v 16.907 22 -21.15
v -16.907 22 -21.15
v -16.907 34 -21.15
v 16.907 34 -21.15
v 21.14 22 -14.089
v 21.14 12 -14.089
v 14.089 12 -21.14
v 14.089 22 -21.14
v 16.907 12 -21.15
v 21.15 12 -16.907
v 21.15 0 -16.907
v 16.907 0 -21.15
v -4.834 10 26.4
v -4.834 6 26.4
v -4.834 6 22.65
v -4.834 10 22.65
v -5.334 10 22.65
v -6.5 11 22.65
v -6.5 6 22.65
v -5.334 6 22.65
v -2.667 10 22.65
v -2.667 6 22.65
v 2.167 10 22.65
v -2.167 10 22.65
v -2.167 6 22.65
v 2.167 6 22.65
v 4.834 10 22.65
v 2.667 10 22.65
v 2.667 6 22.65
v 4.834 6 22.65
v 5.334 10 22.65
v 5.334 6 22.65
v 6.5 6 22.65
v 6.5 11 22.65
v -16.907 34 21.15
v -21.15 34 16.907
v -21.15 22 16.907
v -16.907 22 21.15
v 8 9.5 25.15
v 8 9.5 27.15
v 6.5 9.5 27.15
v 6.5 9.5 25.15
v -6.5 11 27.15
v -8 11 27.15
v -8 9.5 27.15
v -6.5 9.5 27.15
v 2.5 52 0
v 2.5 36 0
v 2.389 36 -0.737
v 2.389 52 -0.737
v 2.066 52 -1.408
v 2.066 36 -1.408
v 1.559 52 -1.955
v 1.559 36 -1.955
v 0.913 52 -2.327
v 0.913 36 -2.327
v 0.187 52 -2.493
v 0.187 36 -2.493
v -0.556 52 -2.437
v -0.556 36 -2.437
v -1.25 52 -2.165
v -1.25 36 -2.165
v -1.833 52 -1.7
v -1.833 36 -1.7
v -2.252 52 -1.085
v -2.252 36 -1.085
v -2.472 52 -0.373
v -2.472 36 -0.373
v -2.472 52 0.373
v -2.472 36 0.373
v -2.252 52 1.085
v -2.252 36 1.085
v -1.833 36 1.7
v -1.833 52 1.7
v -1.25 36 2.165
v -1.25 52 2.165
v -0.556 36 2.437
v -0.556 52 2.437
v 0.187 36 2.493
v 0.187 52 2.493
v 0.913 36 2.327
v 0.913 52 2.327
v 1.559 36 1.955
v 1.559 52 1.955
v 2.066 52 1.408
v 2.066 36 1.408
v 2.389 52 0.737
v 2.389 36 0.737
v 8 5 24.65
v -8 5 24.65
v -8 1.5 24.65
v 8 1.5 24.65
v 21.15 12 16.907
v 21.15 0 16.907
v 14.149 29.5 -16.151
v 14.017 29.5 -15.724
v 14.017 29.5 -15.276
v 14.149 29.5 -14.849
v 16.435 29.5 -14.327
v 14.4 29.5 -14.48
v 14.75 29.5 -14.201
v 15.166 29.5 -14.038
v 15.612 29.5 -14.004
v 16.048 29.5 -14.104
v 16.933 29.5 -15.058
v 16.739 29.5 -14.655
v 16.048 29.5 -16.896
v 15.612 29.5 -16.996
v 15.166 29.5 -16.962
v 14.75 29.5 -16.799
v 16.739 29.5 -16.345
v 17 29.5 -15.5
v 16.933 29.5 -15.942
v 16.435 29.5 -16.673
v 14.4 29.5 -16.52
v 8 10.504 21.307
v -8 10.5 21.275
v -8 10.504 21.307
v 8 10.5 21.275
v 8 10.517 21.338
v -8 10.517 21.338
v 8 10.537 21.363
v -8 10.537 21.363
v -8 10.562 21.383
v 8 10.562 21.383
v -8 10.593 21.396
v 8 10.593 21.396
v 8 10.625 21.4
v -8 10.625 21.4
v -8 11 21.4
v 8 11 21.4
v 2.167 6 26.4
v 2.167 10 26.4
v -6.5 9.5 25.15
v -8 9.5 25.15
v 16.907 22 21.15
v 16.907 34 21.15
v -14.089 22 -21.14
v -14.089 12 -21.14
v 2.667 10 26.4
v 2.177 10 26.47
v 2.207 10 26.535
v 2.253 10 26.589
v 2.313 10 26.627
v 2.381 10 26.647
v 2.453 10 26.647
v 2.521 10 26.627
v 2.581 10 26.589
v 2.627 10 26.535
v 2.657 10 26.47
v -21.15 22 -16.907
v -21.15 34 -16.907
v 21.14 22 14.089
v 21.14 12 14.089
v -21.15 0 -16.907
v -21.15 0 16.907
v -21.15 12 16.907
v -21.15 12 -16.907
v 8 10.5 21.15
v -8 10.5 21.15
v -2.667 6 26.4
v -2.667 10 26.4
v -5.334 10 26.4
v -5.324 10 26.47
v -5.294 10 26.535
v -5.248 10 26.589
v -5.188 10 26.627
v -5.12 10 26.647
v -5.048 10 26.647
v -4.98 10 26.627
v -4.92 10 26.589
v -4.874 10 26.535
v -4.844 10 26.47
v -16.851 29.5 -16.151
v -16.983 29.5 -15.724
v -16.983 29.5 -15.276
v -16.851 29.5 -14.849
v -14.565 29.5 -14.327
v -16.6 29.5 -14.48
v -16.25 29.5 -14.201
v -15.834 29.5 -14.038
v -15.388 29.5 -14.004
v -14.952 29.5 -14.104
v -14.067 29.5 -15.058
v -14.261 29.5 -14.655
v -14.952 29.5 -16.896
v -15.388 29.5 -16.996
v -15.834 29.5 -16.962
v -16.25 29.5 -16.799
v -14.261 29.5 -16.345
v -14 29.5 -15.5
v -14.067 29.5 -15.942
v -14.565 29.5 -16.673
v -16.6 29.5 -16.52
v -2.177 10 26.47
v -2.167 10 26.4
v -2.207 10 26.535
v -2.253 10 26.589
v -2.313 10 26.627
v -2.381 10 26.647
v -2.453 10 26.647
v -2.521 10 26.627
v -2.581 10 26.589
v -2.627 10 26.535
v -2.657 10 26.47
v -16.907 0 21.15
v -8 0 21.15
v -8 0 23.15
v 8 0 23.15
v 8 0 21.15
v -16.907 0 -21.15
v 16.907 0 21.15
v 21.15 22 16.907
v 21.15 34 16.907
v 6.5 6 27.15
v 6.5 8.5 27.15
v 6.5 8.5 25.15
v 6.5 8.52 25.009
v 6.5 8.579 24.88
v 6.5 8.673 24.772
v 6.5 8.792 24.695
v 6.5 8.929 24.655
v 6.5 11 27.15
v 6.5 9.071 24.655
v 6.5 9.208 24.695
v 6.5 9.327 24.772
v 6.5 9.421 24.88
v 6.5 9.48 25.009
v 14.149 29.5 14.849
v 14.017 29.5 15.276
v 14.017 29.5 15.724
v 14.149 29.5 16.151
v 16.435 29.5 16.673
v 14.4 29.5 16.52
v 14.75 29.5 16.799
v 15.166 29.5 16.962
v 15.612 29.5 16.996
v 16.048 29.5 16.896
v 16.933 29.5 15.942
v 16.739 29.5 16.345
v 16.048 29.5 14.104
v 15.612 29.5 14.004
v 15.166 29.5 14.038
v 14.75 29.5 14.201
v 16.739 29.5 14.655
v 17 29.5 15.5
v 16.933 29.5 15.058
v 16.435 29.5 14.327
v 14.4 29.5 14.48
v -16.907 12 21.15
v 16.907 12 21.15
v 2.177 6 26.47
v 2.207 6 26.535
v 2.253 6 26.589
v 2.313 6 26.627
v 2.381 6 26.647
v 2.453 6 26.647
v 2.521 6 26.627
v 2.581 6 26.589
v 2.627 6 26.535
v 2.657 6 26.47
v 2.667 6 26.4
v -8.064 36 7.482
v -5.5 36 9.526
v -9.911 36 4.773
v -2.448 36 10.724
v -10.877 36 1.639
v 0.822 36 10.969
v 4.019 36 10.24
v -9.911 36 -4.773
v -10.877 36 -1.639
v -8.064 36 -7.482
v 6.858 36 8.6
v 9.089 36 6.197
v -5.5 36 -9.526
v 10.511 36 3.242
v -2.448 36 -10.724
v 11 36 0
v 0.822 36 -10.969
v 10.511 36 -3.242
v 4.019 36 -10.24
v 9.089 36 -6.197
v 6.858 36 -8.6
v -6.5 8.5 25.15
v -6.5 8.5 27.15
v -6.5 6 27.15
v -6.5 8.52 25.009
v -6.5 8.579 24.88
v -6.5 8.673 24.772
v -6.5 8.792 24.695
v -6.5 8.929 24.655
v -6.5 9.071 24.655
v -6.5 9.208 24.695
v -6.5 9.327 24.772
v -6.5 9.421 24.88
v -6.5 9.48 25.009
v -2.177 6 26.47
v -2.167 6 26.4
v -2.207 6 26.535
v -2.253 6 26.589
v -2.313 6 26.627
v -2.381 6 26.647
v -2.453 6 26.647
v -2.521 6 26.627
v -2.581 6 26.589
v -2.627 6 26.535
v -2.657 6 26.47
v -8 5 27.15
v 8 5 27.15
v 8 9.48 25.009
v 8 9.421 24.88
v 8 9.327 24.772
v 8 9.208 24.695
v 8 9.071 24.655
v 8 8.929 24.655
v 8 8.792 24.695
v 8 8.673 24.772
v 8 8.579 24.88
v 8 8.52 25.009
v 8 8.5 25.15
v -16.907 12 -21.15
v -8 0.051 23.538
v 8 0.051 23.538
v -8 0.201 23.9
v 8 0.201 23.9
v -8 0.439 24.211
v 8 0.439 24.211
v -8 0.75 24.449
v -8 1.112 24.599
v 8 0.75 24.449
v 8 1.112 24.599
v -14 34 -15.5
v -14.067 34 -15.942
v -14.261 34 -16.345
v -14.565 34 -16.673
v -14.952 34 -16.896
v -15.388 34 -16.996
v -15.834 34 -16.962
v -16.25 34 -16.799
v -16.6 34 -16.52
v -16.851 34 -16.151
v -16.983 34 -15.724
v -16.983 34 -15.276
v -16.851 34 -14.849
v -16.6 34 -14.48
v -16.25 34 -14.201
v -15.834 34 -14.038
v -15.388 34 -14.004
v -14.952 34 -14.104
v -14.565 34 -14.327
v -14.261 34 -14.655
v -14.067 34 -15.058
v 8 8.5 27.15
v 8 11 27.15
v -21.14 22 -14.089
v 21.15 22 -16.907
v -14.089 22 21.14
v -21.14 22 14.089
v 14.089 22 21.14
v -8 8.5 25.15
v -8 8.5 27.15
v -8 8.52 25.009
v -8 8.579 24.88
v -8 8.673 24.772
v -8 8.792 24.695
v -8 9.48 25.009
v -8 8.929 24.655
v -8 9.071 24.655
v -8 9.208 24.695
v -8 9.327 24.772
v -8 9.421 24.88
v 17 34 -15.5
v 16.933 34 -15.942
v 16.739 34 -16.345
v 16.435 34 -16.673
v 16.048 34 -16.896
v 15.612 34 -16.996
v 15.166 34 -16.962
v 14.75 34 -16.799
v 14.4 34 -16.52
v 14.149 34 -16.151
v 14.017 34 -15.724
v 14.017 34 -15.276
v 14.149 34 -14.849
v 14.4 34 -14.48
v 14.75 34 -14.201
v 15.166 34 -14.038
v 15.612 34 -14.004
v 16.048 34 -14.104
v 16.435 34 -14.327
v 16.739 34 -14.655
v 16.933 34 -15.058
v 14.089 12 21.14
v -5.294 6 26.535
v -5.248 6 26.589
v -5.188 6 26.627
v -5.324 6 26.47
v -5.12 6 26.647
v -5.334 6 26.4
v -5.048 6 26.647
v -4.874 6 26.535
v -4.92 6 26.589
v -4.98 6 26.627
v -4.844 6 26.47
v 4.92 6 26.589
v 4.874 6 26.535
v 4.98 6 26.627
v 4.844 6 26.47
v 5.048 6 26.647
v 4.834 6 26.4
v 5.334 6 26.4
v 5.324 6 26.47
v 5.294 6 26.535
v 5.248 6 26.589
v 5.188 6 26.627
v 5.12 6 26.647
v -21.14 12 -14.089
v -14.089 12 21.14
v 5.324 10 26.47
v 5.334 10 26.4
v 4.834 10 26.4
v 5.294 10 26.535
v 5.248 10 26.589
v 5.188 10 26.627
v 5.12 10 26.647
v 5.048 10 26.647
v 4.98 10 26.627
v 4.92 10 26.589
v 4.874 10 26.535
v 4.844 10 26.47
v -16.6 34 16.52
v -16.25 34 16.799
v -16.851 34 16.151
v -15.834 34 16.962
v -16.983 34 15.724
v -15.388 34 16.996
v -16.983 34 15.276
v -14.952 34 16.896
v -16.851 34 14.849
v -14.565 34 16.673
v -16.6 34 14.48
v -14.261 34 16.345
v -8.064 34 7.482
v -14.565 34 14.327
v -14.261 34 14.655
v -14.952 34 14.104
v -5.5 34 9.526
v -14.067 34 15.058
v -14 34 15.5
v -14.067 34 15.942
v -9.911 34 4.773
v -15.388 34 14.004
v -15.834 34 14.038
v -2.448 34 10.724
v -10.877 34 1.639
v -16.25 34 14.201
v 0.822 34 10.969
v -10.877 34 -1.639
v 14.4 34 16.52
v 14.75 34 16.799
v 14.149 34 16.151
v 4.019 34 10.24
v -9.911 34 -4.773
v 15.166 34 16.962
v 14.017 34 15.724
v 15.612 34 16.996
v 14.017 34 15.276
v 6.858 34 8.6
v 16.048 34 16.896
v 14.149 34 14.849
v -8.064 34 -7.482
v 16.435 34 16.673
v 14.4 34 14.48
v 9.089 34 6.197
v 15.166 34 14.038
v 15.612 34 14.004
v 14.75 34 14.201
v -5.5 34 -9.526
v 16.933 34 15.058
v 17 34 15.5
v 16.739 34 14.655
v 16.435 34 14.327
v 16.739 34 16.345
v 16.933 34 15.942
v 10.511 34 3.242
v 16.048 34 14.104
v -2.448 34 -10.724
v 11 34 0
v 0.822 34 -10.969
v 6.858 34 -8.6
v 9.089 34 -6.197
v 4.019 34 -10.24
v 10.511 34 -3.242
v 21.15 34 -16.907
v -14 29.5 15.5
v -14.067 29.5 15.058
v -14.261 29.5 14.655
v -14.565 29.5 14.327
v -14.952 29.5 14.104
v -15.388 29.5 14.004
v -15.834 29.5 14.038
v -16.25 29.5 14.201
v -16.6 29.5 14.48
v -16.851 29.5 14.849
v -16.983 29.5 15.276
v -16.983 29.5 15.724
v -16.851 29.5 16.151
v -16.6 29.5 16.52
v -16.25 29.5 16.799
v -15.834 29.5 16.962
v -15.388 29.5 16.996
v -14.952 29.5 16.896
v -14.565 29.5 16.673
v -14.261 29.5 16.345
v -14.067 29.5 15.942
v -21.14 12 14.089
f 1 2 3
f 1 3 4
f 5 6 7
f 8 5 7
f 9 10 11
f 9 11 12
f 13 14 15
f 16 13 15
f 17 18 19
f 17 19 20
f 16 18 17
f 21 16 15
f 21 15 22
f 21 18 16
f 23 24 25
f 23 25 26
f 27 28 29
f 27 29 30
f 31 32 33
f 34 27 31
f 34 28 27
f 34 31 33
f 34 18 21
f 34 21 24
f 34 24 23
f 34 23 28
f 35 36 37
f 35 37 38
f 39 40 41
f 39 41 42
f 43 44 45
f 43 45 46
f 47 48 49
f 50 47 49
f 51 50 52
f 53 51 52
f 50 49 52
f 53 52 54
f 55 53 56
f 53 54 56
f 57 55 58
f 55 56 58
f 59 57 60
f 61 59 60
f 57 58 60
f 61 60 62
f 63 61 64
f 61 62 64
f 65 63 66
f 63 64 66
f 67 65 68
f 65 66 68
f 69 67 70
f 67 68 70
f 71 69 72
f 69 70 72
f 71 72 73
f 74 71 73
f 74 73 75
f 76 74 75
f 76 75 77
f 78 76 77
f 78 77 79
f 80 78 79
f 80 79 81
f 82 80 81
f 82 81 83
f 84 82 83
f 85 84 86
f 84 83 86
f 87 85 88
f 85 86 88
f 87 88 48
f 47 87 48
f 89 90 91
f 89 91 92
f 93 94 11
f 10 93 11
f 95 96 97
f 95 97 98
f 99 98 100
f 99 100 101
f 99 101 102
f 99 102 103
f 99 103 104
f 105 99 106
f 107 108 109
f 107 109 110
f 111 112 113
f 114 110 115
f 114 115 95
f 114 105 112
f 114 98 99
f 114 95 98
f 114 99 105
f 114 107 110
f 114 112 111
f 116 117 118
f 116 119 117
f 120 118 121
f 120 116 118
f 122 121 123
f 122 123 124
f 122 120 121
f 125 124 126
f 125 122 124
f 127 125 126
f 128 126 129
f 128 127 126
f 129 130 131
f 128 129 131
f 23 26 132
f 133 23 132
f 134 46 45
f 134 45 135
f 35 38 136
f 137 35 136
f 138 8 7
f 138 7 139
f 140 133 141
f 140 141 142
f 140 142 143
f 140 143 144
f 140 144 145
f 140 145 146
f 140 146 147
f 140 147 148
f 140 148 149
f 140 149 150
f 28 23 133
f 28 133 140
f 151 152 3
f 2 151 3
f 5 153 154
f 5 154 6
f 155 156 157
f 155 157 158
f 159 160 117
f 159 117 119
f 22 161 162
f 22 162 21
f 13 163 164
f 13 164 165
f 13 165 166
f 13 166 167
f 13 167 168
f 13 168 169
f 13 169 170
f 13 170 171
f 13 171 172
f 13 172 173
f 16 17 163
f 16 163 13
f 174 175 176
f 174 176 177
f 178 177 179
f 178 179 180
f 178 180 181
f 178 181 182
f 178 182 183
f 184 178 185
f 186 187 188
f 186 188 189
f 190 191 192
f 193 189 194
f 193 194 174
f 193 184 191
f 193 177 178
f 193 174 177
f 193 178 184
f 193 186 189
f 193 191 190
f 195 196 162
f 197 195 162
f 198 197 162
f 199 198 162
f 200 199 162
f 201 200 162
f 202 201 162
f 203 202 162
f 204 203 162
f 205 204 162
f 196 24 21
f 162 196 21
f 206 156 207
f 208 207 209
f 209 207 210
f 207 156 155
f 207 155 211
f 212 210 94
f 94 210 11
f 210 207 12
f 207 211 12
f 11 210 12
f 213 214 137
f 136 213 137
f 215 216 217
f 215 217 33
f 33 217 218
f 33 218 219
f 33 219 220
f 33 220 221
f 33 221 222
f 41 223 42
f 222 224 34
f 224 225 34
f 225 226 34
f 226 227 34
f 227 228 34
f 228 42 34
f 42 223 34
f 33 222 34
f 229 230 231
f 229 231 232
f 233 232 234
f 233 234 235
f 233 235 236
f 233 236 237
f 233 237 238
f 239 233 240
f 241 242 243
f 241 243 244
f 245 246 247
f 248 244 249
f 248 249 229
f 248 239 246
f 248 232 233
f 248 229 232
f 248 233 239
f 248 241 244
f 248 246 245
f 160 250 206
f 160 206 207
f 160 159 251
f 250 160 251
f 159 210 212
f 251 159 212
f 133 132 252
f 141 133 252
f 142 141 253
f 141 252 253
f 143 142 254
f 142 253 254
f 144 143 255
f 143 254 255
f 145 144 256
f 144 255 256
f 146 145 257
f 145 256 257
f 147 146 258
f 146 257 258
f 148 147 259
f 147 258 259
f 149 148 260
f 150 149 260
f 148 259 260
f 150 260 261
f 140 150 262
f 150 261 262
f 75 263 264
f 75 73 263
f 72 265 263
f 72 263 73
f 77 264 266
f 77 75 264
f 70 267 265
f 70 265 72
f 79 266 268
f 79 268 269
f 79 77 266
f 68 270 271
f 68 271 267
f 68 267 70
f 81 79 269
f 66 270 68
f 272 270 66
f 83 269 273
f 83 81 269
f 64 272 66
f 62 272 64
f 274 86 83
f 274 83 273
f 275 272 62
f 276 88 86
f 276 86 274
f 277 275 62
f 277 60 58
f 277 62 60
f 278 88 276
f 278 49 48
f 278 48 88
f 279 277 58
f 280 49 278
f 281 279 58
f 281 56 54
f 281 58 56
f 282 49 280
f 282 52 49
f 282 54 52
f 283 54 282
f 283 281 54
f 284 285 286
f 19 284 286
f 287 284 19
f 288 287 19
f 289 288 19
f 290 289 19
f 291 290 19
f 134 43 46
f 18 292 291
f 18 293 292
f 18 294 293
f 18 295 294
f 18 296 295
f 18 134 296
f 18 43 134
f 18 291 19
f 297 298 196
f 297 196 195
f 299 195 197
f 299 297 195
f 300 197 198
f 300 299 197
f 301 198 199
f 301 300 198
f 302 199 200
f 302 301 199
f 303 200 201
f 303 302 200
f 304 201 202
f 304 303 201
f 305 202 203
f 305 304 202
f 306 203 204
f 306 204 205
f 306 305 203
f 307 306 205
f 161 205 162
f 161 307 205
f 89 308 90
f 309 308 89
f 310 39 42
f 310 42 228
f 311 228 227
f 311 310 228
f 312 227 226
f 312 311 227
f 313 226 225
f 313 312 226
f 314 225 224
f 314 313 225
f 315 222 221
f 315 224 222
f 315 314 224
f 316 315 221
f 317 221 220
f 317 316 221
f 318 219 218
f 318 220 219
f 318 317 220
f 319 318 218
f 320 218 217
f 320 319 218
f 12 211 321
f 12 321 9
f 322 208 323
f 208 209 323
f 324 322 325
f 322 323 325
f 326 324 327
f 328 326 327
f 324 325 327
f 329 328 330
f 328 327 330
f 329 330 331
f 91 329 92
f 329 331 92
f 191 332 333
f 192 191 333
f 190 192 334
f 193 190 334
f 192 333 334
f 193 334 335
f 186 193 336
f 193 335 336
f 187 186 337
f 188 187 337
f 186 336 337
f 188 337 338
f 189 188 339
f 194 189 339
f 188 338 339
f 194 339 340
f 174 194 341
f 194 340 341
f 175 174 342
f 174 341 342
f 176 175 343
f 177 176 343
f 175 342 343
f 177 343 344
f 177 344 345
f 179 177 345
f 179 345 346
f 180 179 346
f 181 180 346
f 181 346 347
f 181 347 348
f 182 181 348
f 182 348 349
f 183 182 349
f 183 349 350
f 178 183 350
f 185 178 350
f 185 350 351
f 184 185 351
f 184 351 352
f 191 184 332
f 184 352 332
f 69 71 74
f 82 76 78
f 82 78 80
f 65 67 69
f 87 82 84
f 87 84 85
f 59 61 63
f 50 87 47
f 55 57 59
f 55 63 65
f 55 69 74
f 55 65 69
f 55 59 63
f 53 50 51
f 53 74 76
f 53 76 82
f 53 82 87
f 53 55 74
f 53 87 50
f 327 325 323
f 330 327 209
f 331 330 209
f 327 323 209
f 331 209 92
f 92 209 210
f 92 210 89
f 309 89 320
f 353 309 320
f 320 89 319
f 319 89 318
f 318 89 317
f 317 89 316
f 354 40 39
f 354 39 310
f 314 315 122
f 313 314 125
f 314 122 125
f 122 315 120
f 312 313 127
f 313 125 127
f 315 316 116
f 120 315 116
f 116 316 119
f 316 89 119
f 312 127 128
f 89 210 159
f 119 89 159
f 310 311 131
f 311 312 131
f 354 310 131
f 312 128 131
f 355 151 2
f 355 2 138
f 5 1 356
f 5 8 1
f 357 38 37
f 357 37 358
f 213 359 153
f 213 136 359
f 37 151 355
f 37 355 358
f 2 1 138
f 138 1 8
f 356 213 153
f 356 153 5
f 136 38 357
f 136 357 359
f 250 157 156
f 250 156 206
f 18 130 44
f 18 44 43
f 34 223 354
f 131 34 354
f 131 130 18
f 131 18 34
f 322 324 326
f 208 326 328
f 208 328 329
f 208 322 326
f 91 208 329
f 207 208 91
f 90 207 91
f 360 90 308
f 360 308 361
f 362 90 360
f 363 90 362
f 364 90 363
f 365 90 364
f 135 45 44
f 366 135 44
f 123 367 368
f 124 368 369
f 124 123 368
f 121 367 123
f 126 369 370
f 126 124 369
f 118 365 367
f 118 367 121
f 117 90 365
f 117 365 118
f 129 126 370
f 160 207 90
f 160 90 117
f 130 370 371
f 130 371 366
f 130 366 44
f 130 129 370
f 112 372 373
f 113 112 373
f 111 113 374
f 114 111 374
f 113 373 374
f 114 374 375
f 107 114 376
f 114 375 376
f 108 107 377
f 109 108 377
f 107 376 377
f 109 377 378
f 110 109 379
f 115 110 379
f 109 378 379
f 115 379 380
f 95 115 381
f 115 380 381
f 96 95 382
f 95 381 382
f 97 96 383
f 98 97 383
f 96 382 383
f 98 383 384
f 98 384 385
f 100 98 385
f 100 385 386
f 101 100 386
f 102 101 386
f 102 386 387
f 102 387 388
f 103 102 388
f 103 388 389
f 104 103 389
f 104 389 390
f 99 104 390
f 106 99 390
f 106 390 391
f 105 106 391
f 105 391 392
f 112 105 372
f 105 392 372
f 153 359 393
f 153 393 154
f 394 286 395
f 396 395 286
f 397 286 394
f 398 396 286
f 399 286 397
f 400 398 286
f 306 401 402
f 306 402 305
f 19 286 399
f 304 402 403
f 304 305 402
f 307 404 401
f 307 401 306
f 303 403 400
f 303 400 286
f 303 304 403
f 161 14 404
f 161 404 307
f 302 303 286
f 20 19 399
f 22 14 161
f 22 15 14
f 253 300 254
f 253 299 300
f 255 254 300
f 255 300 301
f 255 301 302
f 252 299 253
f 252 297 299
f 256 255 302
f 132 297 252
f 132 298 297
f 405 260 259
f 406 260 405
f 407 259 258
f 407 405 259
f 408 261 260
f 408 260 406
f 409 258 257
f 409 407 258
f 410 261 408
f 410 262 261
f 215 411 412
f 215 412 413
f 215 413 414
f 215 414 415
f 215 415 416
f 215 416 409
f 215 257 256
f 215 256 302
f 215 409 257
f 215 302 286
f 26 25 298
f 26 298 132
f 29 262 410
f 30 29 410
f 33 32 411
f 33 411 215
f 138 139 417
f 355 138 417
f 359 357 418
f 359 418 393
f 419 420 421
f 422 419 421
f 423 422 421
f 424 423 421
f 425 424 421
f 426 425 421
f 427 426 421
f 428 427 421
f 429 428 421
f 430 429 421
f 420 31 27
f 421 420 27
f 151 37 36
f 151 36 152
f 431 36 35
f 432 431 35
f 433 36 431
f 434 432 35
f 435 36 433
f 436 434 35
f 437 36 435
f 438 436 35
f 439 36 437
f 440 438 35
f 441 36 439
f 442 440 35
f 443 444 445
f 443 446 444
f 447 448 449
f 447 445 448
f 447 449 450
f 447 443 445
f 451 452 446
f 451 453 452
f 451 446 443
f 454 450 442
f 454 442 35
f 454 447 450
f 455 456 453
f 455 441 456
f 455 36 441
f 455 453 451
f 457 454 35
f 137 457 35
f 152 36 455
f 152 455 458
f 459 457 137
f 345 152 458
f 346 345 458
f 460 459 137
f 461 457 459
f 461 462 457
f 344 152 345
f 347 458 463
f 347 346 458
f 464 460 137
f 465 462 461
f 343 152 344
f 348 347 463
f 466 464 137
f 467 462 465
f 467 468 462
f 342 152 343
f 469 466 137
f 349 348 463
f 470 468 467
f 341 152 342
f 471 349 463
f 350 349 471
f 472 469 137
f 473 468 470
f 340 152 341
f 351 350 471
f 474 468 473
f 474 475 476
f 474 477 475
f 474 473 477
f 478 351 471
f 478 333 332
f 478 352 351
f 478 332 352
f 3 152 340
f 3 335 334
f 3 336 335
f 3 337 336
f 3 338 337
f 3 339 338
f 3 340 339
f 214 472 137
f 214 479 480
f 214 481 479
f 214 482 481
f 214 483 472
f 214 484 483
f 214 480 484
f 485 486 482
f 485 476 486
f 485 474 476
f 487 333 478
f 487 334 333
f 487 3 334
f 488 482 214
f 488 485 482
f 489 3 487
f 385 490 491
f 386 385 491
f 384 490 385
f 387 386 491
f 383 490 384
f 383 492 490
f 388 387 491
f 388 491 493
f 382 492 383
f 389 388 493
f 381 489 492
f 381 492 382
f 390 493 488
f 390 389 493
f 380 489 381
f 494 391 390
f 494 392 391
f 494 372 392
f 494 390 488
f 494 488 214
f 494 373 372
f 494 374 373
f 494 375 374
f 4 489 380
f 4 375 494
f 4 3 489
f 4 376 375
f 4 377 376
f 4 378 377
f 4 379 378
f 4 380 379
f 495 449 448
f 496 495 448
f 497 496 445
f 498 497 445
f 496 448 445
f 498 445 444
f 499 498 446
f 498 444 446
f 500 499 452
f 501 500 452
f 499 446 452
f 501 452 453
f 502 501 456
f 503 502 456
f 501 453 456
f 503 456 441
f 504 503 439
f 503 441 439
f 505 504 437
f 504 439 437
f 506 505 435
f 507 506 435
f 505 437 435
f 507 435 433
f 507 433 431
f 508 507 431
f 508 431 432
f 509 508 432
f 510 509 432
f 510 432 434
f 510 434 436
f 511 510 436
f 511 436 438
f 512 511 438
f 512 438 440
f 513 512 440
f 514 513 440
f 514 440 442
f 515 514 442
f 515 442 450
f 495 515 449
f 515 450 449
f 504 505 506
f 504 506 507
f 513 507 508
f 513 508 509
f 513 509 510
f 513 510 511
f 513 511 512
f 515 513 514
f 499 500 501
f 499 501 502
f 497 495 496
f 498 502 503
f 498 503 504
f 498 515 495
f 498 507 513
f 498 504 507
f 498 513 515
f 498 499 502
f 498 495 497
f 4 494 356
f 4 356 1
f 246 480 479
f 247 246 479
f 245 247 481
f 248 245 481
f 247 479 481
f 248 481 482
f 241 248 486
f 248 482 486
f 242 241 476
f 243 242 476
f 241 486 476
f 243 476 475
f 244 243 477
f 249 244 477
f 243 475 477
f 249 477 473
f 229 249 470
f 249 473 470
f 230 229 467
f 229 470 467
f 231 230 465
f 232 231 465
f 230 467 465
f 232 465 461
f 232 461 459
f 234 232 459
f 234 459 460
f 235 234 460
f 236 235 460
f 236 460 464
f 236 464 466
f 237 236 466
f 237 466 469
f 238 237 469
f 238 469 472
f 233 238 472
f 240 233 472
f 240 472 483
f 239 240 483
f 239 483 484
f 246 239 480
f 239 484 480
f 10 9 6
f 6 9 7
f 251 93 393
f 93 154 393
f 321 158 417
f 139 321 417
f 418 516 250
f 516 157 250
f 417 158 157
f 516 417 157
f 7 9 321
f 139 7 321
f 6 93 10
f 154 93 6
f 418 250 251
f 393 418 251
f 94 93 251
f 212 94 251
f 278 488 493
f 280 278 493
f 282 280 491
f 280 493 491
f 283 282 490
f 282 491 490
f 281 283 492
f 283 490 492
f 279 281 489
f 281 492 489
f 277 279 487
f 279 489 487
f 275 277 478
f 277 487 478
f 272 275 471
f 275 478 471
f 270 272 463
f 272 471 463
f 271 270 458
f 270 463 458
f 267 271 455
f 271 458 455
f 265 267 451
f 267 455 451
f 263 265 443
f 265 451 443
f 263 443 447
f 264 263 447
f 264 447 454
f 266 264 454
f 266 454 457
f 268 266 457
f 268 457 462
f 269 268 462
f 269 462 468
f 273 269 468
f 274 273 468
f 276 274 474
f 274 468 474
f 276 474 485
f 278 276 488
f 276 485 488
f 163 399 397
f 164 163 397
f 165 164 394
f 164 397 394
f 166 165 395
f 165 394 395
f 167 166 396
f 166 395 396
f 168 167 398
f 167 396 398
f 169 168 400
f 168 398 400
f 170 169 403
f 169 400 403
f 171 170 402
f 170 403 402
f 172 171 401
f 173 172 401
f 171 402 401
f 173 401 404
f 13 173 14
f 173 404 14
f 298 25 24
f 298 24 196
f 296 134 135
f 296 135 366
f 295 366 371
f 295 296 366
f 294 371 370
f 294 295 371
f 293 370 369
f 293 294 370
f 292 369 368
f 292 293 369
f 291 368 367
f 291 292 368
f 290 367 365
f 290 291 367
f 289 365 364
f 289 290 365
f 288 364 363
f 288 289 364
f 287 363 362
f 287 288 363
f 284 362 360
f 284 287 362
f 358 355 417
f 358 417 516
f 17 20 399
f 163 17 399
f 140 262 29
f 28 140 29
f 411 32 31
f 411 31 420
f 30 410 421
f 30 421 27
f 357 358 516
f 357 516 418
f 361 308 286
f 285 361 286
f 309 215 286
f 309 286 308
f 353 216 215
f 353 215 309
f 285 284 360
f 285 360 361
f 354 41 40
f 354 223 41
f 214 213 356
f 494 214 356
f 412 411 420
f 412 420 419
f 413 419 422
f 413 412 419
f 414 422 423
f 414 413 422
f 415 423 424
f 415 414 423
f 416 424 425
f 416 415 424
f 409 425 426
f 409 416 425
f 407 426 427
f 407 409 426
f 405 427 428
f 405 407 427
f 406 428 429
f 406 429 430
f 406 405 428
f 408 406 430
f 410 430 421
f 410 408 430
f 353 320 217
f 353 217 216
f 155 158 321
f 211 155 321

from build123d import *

# Parameters (mm, degrees)
SKETCH1_W               = 42.3
SKETCH1_H               = 42.3
BOSS_EXTRUDE1_DEPTH     = 34
SKETCH2_R               = 11
BOSS_EXTRUDE2_DEPTH     = 2
SKETCH3_R               = 2.5
BOSS_EXTRUDE3_DEPTH     = 16
CUT_EXTRUDE1_DEPTH      = 19
CUT_EXTRUDE1_DEPTH_BACK = 35
SKETCH5_W               = 33.814718626
SKETCH5_H               = 10
CUT_EXTRUDE2_DEPTH      = 0.01
CUT_EXTRUDE3_START      = -12
CUT_EXTRUDE3_DEPTH      = 10
CIRPATTERN1_COUNT       = 4
SKETCH7_R               = 1.5
CUT_EXTRUDE4_DEPTH      = 4.5
SKETCH8_W               = 16
SKETCH8_H               = 11
BOSS_EXTRUDE4_DEPTH     = 6
SKETCH9_W               = 16
SKETCH9_H               = 5
CUT_EXTRUDE5_DEPTH      = 2.5
FILLET1_R               = 1.5
SKETCH10_W              = 13
SKETCH10_H              = 4.5
CUT_EXTRUDE6_DEPTH      = 5
CUT_EXTRUDE7_DEPTH      = 30.15
BOSS_EXTRUDE5_DEPTH     = 4
SKETCH13_W              = 16
SKETCH13_H              = 0.25
CUT_EXTRUDE8_DEPTH      = 0.5
FILLET2_R               = 0.125


with BuildPart() as part:
    # Sketch1 → Boss-Extrude1 (new body)
    with BuildSketch(Plane(origin=(0, 0, 0), x_dir=(1, 0, 0), z_dir=(0, 1, 0))):
        Rectangle(SKETCH1_W, SKETCH1_H)
    extrude(amount=BOSS_EXTRUDE1_DEPTH)

    # Sketch2 → Boss-Extrude2 (add)
    with BuildSketch(Plane(origin=(0, 34, 0), x_dir=(1, 0, 0), z_dir=(0, 1, 0))):
        Circle(SKETCH2_R)
    extrude(amount=BOSS_EXTRUDE2_DEPTH)

    # Sketch3 → Boss-Extrude3 (add)
    with BuildSketch(Plane(origin=(0, 36, 0), x_dir=(1, 0, 0), z_dir=(0, 1, 0))):
        Circle(SKETCH3_R)
    extrude(amount=BOSS_EXTRUDE3_DEPTH)

    # Sketch4 → Cut-Extrude1 (cut, two sides)
    with BuildSketch(Plane(origin=(0, 34, 0), x_dir=(1, 0, 0), z_dir=(0, 1, 0))) as cut_extrude1_sk:
        Polygon((-21.15, 16.907359313), (-16.907359313, 21.15), (-21.15, 21.15), align=None)
        Polygon((21.15, 21.15), (21.15, 16.907359313), (16.907359313, 21.15), align=None)
        Polygon((21.15, -16.907359313), (16.907359313, -21.15), (21.15, -21.15), align=None)
        Polygon((-21.15, -21.15), (-21.15, -16.907359313), (-16.907359313, -21.15), align=None)
    extrude(amount=CUT_EXTRUDE1_DEPTH, mode=Mode.SUBTRACT)
    extrude(cut_extrude1_sk.sketch, amount=-CUT_EXTRUDE1_DEPTH_BACK, mode=Mode.SUBTRACT)

    # Sketch5 → Cut-Extrude2 (cut)
    with BuildSketch(Plane(origin=(21.15, 0, 0), x_dir=(0, 0, -1), z_dir=(1, 0, 0))):
        with Locations((0, 17)):
            Rectangle(SKETCH5_W, SKETCH5_H)
    cut_extrude2 = extrude(amount=-CUT_EXTRUDE2_DEPTH, mode=Mode.SUBTRACT)

    # Sketch6 → Cut-Extrude3 (cut)
    with BuildSketch(Plane(origin=(0, 34, 0), x_dir=(1, 0, 0), z_dir=(0, 1, 0)).offset(CUT_EXTRUDE3_START)):
        Polygon((21.15, 14.078932188), (14.078932188, 21.15), (21.15, 21.15), align=None)
    cut_extrude3 = extrude(amount=-CUT_EXTRUDE3_DEPTH, mode=Mode.SUBTRACT)

    # CirPattern1: Cut-Extrude2, Cut-Extrude3 ×4 about axis
    cirpattern1_axis = Axis((0, 0, 0), (0, 1, 0))
    for i in range(1, CIRPATTERN1_COUNT):
        add(cut_extrude2.rotate(cirpattern1_axis, i * 360 / CIRPATTERN1_COUNT), mode=Mode.SUBTRACT)
        add(cut_extrude3.rotate(cirpattern1_axis, i * 360 / CIRPATTERN1_COUNT), mode=Mode.SUBTRACT)

    # Sketch7 → Cut-Extrude4 (cut)
    with BuildSketch(Plane(origin=(0, 34, 0), x_dir=(1, 0, 0), z_dir=(0, 1, 0))):
        with Locations((15.5, 15.5)):
            Circle(SKETCH7_R)
        with Locations((15.5, -15.5)):
            Circle(SKETCH7_R)
        with Locations((-15.5, -15.5)):
            Circle(SKETCH7_R)
        with Locations((-15.5, 15.5)):
            Circle(SKETCH7_R)
    extrude(amount=-CUT_EXTRUDE4_DEPTH, mode=Mode.SUBTRACT)

    # Sketch8 → Boss-Extrude4 (add)
    with BuildSketch(Plane.XY.offset(21.15)):
        with Locations((0, 5.5)):
            Rectangle(SKETCH8_W, SKETCH8_H)
    extrude(amount=BOSS_EXTRUDE4_DEPTH)

    # Sketch9 → Cut-Extrude5 (cut)
    with BuildSketch(Plane.XY.offset(27.15)):
        with Locations((0, 2.5)):
            Rectangle(SKETCH9_W, SKETCH9_H)
    extrude(amount=-CUT_EXTRUDE5_DEPTH, mode=Mode.SUBTRACT)

    # Fillet1
    fillet1_edges = [part.edges().sort_by_distance(p)[0] for p in [
        (0, 0, 24.65),
    ]]
    fillet(fillet1_edges, radius=FILLET1_R)

    # Sketch10 → Cut-Extrude6 (cut)
    with BuildSketch(Plane(origin=(0, 11, 0), x_dir=(1, 0, 0), z_dir=(0, 1, 0))):
        with Locations((0, -24.9)):
            Rectangle(SKETCH10_W, SKETCH10_H)
    extrude(amount=-CUT_EXTRUDE6_DEPTH, mode=Mode.SUBTRACT)

    # Sketch11 → Cut-Extrude7 (cut, through all)
    with BuildSketch(Plane(origin=(8, 0, 0), x_dir=(0, 0, -1), z_dir=(1, 0, 0))):
        with BuildLine():
            Line((-27.15, 9.5), (-25.15, 9.5))
            ThreePointArc((-25.15, 9.5), (-24.65, 9), (-25.15, 8.5))
            Line((-25.15, 8.5), (-27.15, 8.5))
            Line((-27.15, 8.5), (-27.15, 9.5))
        make_face()
    extrude(amount=-CUT_EXTRUDE7_DEPTH, mode=Mode.SUBTRACT)

    # Sketch12 → Boss-Extrude5 (add)
    with BuildSketch(Plane(origin=(0, 6, 0), x_dir=(1, 0, 0), z_dir=(0, 1, 0))):
        with BuildLine():
            Line((-2.667, -22.65), (-2.167, -22.65))
            Line((-2.167, -22.65), (-2.167, -26.4))
            ThreePointArc((-2.167, -26.4), (-2.417, -26.65), (-2.667, -26.4))
            Line((-2.667, -26.4), (-2.667, -22.65))
        make_face()
        with BuildLine():
            Line((5.334, -22.65), (5.334, -26.4))
            ThreePointArc((5.334, -26.4), (5.084, -26.65), (4.834, -26.4))
            Line((4.834, -26.4), (4.834, -22.65))
            Line((4.834, -22.65), (5.334, -22.65))
        make_face()
        with BuildLine():
            Line((-4.834, -22.65), (-5.334, -22.65))
            Line((-5.334, -22.65), (-5.334, -26.4))
            ThreePointArc((-5.334, -26.4), (-5.084, -26.65), (-4.834, -26.4))
            Line((-4.834, -26.4), (-4.834, -22.65))
        make_face()
        with BuildLine():
            Line((2.167, -22.65), (2.167, -26.4))
            ThreePointArc((2.167, -26.4), (2.417, -26.65), (2.667, -26.4))
            Line((2.667, -26.4), (2.667, -22.65))
            Line((2.667, -22.65), (2.167, -22.65))
        make_face()
    extrude(amount=BOSS_EXTRUDE5_DEPTH)

    # Sketch13 → Cut-Extrude8 (cut)
    with BuildSketch(Plane(origin=(0, 11, 0), x_dir=(1, 0, 0), z_dir=(0, 1, 0))):
        with Locations((0, -21.275)):
            Rectangle(SKETCH13_W, SKETCH13_H)
    extrude(amount=-CUT_EXTRUDE8_DEPTH, mode=Mode.SUBTRACT)

    # Fillet2
    fillet2_edges = [part.edges().sort_by_distance(p)[0] for p in [
        (0, 10.5, 21.4),
    ]]
    fillet(fillet2_edges, radius=FILLET2_R)


solid = part.part
